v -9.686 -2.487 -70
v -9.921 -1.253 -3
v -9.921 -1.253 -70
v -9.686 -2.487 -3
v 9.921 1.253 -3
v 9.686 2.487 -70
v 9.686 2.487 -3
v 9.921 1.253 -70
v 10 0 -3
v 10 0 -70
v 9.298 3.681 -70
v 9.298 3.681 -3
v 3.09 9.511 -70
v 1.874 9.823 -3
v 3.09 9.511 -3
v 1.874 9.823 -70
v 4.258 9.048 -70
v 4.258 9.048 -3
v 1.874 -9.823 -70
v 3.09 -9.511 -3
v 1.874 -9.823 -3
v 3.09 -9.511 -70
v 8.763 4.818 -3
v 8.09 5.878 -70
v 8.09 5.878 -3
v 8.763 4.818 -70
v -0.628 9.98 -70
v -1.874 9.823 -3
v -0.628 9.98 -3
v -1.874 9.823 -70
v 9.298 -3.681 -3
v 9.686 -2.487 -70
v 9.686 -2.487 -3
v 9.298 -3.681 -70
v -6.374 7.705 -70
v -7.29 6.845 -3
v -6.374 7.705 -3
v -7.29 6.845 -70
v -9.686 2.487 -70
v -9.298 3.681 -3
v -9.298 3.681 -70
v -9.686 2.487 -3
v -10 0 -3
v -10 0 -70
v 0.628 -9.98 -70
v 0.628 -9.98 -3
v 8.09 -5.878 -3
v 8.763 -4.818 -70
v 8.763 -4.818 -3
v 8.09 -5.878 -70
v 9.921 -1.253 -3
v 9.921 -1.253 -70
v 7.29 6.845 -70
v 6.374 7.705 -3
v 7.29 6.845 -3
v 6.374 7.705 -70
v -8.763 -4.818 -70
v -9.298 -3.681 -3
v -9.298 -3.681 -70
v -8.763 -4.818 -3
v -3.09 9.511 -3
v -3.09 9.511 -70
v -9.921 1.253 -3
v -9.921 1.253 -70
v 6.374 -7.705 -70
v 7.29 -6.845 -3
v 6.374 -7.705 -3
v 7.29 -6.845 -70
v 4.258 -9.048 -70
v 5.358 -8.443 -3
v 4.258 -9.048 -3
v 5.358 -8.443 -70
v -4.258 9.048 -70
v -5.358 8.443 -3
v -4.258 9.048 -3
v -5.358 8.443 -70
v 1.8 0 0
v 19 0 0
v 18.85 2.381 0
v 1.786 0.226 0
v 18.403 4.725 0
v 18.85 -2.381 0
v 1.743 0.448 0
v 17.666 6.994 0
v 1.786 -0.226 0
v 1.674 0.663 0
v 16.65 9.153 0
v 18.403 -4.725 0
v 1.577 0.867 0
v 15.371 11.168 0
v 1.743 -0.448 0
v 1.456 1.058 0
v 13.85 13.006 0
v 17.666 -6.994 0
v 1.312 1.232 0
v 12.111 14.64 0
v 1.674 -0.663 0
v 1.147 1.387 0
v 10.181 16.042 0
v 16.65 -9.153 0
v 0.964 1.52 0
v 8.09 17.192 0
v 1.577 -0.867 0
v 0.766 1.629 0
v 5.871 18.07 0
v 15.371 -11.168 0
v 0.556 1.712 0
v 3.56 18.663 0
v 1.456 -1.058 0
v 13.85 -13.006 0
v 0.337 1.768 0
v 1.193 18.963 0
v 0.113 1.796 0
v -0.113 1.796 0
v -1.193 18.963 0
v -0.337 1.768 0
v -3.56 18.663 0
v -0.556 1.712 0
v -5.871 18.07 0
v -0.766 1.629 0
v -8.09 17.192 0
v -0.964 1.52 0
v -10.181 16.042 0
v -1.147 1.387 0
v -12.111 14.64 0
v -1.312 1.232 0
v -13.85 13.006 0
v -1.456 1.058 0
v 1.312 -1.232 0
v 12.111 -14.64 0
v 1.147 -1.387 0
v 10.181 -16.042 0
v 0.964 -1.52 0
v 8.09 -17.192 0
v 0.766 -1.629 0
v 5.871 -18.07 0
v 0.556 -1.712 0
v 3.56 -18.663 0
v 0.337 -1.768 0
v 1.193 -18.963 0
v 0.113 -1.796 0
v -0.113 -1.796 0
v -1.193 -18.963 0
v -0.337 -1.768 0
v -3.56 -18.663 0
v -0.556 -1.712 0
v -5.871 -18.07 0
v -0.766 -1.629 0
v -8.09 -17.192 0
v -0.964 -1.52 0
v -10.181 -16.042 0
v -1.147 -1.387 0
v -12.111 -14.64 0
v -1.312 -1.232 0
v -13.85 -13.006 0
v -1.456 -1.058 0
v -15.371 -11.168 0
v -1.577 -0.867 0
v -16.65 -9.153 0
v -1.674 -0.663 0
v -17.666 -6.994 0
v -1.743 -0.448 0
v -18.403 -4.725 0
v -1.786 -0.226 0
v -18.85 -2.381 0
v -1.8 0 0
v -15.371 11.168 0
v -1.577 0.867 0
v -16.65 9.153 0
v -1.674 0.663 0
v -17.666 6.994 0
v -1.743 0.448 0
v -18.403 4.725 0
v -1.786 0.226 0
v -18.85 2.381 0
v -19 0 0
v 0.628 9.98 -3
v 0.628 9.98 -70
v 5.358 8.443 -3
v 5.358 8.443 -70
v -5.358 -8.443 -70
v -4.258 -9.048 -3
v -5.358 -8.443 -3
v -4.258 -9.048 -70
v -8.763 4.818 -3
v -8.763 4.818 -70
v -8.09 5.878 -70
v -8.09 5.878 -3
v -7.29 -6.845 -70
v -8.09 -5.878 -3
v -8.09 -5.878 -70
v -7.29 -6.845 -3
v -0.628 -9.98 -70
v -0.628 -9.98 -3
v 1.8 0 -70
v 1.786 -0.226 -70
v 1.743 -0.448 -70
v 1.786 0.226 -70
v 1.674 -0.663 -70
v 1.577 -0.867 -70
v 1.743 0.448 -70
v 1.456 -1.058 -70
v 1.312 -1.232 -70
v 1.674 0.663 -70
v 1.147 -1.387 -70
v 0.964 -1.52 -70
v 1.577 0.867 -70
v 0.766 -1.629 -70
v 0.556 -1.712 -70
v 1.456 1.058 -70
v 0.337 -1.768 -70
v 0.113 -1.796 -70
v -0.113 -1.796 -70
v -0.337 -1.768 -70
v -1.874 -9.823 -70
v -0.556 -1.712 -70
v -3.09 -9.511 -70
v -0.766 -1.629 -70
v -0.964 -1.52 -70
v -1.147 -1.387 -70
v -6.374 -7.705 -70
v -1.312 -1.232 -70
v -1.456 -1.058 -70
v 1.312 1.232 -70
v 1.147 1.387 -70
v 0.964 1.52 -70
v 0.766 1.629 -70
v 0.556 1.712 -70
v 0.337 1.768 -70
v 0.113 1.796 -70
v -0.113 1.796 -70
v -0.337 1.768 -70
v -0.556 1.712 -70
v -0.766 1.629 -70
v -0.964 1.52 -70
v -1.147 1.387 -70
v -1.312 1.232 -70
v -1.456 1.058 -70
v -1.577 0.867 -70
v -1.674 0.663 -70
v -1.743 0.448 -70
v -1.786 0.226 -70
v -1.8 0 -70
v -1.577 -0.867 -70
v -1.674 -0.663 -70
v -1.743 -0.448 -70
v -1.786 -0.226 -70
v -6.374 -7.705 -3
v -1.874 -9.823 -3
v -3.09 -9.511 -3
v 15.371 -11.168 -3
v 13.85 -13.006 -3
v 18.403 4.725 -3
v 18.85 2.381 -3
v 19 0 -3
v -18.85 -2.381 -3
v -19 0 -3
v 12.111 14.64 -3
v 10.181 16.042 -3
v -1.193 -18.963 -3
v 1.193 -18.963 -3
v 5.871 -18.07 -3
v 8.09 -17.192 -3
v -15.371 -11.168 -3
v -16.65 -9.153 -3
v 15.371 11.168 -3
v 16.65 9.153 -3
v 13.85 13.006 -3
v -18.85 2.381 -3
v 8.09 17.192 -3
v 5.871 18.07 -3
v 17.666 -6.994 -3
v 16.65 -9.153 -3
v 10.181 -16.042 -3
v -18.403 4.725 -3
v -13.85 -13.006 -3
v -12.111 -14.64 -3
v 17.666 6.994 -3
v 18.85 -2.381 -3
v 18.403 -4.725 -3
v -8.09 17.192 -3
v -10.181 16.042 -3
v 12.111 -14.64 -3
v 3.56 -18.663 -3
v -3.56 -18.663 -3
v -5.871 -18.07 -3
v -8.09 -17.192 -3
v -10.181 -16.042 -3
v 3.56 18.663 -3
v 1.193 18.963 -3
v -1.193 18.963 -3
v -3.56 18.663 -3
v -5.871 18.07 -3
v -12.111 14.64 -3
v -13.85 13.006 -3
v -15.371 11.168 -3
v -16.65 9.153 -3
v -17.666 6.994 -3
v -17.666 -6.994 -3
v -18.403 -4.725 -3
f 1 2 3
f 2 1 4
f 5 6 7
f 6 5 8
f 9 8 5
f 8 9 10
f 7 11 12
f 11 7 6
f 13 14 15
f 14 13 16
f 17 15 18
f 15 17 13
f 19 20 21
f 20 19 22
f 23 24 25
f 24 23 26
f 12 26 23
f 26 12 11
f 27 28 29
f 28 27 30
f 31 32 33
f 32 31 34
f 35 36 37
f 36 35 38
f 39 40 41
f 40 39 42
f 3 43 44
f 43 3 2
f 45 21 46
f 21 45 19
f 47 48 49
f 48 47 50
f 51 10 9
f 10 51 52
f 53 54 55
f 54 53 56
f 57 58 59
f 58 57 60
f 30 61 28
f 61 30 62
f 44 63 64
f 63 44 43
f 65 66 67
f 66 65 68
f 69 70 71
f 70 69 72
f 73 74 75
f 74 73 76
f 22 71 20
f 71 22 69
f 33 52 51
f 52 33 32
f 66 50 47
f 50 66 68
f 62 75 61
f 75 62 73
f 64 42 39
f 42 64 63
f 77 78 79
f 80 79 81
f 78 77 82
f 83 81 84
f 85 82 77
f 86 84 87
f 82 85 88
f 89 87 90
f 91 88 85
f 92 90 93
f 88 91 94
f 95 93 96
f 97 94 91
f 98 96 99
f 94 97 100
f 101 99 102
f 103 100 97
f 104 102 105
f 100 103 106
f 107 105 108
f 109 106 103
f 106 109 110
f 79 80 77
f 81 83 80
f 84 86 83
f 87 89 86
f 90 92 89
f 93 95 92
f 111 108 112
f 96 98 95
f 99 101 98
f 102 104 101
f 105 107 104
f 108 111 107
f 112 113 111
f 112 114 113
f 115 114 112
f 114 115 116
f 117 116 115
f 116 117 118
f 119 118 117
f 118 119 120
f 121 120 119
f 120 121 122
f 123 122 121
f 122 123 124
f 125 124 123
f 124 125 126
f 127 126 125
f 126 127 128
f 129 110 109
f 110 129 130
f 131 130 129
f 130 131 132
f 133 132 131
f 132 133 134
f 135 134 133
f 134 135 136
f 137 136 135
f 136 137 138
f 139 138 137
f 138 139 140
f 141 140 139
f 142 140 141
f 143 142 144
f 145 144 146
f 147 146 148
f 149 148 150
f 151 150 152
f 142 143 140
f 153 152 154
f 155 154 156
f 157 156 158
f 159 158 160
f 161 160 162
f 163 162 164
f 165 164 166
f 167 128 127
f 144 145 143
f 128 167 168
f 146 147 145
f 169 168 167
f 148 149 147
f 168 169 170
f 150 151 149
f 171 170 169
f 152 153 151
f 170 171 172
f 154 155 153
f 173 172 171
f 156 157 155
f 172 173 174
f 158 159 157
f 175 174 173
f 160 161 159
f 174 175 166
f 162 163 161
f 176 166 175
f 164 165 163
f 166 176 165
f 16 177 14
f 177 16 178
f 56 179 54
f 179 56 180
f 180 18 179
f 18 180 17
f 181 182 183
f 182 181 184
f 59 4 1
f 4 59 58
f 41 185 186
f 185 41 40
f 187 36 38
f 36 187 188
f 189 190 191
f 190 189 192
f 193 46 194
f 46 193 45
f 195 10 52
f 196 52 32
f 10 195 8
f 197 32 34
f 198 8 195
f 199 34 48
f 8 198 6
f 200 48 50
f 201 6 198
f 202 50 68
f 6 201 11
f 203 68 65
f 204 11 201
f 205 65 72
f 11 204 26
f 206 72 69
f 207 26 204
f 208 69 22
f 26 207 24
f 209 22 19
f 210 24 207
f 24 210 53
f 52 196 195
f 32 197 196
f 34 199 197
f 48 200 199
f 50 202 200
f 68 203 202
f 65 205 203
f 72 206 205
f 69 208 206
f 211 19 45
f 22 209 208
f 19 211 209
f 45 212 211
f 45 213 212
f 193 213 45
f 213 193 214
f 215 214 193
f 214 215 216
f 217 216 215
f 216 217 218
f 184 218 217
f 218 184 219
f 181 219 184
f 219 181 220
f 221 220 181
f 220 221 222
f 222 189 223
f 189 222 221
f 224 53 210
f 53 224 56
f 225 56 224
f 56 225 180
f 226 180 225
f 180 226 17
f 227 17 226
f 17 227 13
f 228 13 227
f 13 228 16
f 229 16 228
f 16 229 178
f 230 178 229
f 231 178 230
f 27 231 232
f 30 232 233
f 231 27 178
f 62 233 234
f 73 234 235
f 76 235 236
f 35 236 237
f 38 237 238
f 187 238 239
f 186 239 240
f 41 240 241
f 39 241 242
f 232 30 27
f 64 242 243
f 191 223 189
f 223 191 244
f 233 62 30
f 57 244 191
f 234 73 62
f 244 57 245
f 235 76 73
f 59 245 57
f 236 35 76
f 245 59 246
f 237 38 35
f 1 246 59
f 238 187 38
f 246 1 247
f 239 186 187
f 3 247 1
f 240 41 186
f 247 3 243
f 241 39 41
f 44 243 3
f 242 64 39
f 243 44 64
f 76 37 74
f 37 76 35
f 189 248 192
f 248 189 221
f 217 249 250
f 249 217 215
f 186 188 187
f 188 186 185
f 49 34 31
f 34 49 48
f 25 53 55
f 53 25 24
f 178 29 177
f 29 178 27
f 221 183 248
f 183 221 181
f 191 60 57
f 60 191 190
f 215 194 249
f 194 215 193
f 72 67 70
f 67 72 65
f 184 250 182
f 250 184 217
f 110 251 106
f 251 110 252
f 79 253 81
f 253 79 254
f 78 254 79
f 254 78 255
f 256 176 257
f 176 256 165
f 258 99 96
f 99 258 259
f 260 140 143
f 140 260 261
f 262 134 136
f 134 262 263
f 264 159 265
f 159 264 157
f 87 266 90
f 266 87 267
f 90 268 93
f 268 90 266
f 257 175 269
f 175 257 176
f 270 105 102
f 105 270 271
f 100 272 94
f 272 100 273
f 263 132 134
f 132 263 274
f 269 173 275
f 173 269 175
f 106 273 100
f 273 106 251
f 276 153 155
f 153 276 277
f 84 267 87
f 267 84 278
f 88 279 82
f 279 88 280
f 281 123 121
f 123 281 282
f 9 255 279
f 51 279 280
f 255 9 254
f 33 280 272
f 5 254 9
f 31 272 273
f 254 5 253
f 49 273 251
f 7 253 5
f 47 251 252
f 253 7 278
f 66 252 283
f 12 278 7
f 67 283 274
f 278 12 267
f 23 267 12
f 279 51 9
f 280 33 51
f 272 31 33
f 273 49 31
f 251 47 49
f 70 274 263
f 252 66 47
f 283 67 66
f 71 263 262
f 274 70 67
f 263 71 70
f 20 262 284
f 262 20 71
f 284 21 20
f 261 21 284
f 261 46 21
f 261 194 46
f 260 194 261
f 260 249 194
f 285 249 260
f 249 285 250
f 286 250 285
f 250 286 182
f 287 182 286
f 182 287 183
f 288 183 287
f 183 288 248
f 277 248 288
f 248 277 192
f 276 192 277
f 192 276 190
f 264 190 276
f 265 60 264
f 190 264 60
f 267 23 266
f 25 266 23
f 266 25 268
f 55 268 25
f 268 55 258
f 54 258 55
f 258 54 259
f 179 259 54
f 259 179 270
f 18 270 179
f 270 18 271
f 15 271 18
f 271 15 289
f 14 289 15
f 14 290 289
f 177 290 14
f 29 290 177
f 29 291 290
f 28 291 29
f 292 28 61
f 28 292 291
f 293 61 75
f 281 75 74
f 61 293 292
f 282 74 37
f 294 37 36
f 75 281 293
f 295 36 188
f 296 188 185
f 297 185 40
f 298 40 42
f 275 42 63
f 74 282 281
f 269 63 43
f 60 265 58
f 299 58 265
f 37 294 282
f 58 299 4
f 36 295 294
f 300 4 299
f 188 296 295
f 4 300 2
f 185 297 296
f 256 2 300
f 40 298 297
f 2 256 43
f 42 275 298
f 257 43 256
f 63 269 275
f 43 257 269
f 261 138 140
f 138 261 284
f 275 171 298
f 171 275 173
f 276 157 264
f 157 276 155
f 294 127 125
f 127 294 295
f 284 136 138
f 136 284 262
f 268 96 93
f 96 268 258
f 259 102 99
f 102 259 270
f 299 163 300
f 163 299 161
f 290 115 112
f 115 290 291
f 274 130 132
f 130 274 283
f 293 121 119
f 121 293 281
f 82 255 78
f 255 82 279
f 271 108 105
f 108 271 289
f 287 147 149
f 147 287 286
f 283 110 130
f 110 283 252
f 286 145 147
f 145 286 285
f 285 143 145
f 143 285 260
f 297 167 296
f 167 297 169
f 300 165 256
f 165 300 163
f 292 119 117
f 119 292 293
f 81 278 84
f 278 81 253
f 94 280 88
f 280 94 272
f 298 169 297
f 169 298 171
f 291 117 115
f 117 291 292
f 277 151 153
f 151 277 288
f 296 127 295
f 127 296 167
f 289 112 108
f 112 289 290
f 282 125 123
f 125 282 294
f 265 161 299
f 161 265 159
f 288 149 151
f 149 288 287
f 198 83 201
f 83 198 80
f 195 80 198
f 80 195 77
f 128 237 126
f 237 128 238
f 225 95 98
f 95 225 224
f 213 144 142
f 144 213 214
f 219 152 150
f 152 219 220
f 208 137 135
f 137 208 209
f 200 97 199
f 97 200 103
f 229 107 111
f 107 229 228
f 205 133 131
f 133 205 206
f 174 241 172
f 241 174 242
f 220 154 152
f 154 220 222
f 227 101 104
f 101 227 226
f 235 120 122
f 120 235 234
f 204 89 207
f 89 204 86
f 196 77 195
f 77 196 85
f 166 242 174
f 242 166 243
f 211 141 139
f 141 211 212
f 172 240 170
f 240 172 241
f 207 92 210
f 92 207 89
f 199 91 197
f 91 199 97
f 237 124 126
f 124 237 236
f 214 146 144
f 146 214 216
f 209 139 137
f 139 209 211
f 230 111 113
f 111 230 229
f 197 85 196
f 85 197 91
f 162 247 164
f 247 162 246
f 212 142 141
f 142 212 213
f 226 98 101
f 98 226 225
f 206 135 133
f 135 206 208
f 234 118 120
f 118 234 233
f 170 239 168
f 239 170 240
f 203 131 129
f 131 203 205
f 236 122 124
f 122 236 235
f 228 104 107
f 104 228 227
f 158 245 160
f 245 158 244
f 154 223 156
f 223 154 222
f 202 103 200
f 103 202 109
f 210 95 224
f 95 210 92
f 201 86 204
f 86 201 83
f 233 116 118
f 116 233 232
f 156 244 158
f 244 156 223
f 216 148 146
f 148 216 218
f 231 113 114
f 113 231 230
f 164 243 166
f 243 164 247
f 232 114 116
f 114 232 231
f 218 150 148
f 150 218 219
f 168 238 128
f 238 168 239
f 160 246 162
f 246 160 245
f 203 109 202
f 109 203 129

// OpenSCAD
$fn = 50;


difference() {
	union() {
		translate(v = [0, 0, -70.0000000000]) {
			cylinder(h = 70, r = 10.0000000000);
		}
		translate(v = [0, 0, -3.0000000000]) {
			cylinder(h = 3, r = 19.0000000000);
		}
	}
	union() {
		#translate(v = [0, 0, -70]) {
			cylinder(h = 70, r = 1.8000000000);
		}
	}
}
